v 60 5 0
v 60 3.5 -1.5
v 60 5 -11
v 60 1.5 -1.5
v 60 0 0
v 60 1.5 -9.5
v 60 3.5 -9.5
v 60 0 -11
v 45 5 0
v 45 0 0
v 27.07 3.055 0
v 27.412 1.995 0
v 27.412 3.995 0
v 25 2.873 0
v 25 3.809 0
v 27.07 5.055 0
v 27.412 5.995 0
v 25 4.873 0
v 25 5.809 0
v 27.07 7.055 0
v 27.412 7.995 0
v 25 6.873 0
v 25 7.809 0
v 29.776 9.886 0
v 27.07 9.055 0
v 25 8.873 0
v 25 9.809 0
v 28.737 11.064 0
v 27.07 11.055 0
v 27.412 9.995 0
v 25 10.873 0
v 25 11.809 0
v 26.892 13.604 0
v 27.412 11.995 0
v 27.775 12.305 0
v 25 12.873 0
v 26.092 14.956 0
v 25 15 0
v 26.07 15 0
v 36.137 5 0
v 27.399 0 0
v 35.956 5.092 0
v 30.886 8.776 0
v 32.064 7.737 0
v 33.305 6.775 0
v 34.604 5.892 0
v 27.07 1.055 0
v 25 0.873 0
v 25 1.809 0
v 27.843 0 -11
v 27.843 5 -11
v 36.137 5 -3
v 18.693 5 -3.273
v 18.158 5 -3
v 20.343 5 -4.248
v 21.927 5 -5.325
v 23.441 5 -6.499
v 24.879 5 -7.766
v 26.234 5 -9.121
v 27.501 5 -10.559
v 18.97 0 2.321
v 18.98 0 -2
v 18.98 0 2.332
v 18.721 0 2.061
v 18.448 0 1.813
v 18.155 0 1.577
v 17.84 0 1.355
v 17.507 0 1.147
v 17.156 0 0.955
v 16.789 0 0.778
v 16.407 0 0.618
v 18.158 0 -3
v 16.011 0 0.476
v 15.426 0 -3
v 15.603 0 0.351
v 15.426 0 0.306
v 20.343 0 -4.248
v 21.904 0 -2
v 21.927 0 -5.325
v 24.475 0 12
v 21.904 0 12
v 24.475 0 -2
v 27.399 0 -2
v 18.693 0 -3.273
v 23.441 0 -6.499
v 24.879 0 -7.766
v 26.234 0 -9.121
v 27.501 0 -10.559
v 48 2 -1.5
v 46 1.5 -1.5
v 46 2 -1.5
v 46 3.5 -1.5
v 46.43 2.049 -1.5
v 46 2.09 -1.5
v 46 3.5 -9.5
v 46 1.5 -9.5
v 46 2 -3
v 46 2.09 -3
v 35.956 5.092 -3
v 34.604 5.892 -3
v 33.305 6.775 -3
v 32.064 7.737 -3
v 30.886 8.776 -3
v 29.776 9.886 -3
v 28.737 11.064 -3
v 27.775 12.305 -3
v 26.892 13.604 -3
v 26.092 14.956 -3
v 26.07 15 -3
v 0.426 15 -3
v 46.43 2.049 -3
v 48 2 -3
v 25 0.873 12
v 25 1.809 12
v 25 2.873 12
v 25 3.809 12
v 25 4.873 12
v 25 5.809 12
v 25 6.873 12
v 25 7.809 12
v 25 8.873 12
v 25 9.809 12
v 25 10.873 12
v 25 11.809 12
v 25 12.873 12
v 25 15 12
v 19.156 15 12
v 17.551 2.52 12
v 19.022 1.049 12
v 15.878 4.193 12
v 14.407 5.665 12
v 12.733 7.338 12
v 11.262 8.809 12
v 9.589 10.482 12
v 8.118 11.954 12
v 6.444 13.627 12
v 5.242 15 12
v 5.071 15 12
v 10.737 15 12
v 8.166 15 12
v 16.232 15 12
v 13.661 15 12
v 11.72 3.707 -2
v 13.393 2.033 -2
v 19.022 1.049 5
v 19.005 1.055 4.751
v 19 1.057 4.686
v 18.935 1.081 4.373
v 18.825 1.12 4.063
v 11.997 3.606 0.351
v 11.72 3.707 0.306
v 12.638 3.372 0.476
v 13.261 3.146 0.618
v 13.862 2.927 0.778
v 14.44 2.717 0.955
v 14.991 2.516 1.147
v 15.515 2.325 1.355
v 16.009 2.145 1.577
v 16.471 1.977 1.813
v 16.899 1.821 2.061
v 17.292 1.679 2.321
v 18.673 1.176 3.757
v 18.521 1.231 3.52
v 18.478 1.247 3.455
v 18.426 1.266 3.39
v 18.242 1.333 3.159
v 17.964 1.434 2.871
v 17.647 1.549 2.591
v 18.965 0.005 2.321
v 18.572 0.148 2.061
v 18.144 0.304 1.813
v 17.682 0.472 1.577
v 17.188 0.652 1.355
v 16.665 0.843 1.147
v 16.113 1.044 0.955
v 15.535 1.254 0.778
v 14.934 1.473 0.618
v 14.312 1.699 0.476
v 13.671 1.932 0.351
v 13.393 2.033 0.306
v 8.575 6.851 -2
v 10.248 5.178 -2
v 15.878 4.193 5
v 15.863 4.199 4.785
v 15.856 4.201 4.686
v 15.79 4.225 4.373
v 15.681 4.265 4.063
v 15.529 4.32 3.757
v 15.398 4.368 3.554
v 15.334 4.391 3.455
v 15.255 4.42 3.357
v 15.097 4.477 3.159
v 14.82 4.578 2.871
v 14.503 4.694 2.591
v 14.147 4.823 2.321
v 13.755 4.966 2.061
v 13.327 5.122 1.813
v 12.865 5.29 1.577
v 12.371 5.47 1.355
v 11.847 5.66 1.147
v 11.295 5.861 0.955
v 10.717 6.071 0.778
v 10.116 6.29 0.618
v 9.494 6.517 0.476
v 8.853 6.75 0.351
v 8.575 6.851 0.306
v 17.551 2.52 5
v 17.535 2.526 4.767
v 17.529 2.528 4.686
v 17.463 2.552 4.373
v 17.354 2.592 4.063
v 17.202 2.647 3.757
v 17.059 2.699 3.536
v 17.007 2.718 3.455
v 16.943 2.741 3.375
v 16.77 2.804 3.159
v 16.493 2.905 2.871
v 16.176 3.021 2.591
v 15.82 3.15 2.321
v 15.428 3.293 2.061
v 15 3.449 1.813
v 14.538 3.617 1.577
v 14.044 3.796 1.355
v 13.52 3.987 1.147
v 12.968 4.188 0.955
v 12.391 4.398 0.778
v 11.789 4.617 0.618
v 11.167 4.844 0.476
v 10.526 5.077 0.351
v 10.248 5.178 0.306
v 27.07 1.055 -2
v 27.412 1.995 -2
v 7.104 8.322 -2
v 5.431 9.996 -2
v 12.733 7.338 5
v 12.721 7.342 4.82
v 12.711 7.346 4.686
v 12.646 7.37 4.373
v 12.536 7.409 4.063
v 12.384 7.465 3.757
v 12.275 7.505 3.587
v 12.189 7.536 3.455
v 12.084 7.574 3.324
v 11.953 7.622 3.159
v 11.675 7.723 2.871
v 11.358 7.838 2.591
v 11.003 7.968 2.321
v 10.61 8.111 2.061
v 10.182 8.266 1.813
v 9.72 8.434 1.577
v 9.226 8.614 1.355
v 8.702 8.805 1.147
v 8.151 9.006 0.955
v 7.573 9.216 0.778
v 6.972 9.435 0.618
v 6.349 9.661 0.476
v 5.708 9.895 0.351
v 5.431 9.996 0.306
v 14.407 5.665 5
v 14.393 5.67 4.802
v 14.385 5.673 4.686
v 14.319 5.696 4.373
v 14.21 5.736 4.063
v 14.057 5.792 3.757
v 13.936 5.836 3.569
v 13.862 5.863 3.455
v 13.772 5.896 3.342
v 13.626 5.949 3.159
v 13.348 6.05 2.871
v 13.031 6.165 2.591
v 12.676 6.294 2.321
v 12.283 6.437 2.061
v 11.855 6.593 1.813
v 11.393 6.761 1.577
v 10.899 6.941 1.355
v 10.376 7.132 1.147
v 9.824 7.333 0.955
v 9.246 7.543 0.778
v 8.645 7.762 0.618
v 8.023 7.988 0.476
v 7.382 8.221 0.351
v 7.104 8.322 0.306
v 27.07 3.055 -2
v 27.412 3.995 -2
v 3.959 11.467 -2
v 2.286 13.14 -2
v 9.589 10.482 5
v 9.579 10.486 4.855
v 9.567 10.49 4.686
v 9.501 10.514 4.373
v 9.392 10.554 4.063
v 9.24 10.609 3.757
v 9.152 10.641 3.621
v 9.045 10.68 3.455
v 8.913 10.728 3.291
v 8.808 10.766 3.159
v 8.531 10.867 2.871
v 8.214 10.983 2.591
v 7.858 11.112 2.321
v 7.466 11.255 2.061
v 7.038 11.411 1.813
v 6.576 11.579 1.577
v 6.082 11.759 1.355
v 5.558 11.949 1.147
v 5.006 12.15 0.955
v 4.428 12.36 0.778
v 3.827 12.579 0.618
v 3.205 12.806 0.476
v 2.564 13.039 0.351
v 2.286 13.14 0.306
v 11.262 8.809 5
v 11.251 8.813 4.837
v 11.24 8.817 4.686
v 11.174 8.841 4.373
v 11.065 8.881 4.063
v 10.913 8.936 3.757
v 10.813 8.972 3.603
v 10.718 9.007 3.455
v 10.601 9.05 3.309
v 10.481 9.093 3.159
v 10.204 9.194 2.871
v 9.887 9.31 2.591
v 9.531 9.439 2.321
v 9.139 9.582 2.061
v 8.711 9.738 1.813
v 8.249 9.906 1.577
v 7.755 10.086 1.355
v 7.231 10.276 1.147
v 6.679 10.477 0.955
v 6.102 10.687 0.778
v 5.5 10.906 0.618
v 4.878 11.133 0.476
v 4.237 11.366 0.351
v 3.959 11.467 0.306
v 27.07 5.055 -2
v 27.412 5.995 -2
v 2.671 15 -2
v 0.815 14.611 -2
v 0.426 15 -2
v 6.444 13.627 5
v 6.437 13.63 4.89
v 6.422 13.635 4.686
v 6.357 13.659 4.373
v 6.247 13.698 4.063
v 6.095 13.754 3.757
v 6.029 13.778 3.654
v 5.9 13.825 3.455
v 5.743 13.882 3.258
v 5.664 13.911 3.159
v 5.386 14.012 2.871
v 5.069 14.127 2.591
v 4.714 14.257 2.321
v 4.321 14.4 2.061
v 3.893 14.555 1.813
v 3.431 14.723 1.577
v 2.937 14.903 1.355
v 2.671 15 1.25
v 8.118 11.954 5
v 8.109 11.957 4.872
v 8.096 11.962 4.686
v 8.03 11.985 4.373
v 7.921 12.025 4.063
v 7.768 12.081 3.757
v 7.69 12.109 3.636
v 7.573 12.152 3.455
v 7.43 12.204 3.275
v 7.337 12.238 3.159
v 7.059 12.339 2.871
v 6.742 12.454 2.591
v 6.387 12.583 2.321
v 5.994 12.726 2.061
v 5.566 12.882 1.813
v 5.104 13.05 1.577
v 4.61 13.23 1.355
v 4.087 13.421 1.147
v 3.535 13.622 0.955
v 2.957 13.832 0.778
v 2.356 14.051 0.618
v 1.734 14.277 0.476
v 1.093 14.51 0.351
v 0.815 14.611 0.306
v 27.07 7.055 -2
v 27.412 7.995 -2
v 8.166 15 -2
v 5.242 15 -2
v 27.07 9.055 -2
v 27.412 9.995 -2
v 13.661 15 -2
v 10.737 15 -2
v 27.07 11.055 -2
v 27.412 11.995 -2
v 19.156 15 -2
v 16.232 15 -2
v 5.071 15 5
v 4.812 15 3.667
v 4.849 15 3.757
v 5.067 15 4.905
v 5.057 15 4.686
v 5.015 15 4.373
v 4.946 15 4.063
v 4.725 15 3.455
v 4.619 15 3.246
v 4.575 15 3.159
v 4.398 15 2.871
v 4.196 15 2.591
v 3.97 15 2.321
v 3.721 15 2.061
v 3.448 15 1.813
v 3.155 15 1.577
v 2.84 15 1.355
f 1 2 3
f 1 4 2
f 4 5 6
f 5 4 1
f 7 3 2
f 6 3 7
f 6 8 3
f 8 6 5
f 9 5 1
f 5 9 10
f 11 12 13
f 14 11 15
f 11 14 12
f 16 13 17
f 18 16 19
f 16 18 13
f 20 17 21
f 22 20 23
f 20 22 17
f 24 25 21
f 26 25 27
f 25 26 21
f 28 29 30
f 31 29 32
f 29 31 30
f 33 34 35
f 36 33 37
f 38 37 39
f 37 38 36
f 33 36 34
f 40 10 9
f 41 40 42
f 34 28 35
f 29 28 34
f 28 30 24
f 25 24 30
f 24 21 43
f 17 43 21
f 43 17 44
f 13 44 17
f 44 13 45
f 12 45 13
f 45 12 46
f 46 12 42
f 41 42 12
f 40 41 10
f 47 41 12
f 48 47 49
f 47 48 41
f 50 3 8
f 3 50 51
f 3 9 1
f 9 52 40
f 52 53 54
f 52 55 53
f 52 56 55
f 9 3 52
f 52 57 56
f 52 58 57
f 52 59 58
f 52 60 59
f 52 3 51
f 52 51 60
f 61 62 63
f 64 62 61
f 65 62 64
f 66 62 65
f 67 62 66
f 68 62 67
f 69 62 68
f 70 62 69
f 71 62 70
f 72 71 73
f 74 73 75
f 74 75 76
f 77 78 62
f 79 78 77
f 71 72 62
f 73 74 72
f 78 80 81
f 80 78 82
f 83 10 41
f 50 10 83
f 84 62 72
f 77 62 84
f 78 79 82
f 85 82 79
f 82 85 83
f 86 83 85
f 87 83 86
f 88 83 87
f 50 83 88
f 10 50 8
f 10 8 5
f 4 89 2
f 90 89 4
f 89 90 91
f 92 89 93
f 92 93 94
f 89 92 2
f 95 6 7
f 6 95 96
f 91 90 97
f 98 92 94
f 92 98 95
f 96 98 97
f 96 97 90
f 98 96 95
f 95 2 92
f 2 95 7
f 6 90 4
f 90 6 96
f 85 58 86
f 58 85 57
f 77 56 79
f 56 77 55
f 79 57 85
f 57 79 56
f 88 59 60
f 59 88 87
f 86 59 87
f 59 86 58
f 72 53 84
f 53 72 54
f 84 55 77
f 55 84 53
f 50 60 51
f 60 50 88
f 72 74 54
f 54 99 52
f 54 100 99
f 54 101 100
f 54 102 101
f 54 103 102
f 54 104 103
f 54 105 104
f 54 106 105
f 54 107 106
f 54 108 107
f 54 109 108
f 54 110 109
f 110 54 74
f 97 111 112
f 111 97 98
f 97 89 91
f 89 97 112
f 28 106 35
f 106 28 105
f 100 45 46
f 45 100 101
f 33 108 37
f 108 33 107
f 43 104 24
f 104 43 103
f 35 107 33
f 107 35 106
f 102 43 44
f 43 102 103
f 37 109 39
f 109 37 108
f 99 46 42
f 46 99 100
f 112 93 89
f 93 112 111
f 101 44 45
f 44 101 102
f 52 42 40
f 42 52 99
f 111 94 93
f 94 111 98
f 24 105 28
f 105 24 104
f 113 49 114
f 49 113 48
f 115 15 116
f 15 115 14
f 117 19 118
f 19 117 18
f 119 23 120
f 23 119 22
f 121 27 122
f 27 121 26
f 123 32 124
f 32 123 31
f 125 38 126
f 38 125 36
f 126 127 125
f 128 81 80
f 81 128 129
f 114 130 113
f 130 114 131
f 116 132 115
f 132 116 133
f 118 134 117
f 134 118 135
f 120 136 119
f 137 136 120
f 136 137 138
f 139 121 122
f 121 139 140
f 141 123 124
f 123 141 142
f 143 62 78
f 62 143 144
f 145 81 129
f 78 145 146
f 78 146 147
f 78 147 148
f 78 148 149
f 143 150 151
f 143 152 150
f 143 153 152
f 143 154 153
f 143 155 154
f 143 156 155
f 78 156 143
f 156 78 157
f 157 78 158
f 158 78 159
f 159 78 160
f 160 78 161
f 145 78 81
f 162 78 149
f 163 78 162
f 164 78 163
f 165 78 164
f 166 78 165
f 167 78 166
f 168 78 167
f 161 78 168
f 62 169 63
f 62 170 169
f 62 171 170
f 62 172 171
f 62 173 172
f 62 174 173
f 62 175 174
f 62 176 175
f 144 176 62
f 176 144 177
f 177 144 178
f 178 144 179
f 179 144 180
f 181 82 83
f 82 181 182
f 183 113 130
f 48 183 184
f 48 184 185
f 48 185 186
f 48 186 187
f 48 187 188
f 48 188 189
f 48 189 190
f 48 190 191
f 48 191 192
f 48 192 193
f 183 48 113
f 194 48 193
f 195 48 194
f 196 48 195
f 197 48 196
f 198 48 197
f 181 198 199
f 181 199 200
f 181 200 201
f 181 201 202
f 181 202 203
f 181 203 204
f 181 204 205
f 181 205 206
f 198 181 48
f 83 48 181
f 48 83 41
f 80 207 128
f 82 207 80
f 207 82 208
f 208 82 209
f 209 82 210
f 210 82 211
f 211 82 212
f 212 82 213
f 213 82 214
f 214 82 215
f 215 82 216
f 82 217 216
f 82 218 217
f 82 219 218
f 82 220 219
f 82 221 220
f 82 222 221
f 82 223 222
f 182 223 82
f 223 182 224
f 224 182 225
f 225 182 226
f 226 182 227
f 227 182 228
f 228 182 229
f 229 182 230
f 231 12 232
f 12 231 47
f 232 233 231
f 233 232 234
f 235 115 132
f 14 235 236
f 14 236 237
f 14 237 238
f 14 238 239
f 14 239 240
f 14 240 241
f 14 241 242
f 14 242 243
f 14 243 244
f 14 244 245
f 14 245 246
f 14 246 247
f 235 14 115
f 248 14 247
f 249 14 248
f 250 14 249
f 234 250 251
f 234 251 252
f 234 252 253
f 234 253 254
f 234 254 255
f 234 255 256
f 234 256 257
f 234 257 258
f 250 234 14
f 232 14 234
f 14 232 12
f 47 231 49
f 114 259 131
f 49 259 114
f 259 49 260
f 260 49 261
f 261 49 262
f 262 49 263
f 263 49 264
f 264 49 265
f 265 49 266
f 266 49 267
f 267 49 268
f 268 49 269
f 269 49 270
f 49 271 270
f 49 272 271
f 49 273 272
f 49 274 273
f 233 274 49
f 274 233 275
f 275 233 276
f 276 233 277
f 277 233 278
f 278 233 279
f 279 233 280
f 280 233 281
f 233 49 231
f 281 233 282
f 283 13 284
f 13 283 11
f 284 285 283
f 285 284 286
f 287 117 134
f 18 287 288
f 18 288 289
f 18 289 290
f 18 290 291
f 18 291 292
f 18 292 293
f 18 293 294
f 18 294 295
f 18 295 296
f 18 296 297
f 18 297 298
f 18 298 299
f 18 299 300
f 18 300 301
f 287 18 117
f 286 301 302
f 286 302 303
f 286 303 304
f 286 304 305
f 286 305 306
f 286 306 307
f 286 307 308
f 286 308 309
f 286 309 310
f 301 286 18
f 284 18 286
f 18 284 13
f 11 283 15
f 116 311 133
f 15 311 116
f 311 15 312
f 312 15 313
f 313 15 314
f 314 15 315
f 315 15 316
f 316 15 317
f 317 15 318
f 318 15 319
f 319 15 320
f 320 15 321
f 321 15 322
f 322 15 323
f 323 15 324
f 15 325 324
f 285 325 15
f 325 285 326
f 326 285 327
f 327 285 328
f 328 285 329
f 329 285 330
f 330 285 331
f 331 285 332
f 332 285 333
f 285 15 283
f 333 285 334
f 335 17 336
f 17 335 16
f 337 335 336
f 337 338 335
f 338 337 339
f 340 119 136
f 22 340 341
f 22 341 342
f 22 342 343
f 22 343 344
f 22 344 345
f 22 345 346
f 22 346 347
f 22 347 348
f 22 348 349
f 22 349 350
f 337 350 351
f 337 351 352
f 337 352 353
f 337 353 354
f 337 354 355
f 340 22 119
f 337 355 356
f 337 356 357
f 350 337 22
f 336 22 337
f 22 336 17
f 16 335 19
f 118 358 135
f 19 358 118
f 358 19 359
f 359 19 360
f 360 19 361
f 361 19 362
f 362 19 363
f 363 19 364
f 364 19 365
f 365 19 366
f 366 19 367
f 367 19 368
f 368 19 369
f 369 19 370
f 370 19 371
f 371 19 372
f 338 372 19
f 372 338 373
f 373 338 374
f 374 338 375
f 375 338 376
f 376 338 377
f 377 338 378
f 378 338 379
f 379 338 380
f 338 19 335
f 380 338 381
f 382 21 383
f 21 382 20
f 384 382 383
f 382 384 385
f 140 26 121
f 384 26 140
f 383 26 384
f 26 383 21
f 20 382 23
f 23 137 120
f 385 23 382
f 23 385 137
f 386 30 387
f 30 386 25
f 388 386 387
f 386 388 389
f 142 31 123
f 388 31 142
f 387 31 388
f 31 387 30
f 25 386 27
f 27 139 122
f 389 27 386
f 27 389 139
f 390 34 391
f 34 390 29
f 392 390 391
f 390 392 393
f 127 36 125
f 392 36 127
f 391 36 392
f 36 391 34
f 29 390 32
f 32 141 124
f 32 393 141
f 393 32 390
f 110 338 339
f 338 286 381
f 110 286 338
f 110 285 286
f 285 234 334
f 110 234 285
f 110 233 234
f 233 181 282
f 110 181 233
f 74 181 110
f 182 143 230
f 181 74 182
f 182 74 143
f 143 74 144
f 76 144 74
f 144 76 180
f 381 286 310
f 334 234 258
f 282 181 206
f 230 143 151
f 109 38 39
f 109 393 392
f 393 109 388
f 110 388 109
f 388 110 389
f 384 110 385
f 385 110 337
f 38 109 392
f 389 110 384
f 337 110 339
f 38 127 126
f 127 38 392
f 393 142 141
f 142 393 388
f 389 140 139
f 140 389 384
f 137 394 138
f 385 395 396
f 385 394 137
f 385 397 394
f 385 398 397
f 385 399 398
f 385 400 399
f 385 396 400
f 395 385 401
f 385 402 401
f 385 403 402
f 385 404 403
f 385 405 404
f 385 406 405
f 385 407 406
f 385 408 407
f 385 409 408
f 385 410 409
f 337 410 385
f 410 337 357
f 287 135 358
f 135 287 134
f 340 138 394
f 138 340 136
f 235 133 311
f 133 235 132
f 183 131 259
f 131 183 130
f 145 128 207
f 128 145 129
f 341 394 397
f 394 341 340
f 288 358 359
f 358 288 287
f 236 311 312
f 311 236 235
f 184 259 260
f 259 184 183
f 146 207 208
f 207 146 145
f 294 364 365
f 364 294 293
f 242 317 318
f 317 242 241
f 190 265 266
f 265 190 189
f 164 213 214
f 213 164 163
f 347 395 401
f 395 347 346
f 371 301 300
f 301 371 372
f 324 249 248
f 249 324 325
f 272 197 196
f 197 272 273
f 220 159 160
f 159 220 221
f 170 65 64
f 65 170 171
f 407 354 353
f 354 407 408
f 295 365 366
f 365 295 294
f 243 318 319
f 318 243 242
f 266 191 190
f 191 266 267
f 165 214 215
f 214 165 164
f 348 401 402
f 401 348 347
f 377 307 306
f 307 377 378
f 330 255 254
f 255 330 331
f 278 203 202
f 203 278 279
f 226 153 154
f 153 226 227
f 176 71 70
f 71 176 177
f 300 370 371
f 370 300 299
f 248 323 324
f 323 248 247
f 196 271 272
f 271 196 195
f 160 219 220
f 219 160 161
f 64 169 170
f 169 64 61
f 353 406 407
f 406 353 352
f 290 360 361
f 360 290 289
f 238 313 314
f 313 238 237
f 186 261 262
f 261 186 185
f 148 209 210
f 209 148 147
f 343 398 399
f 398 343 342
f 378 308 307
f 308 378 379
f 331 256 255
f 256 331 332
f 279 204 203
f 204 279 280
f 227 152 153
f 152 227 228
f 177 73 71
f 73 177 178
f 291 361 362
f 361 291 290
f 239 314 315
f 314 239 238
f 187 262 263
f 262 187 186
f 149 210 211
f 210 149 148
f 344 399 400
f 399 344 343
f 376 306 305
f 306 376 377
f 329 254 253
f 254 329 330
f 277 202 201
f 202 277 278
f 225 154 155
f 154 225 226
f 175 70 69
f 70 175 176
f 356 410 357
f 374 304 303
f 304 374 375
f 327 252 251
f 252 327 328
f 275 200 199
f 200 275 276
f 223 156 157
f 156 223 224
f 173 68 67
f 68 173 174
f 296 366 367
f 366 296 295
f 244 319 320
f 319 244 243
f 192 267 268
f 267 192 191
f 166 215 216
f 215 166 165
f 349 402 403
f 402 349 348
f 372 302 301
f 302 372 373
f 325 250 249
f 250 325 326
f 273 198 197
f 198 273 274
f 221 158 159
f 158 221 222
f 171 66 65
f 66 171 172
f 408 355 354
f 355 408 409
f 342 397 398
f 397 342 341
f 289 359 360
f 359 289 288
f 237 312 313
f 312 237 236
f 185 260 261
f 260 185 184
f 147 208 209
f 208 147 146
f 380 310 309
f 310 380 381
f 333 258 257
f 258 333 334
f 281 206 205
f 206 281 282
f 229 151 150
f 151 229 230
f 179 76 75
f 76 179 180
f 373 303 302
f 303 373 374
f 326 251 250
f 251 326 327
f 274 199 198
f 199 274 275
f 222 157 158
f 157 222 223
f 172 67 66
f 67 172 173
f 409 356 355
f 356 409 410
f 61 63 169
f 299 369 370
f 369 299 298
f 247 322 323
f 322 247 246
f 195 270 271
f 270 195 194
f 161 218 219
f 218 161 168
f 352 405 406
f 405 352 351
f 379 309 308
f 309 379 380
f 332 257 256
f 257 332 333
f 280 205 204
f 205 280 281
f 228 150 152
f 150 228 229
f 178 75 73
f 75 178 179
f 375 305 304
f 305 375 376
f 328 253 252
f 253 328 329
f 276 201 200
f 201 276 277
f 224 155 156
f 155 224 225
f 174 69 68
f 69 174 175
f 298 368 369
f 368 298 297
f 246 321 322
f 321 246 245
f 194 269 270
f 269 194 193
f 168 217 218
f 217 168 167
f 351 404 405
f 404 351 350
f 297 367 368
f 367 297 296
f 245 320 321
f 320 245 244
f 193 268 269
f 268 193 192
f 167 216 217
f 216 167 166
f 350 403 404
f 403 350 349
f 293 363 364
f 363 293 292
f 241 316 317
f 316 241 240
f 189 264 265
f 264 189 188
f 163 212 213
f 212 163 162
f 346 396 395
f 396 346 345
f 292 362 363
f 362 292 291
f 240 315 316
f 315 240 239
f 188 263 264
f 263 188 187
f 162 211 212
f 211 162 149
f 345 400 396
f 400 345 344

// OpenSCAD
$fn = 100;

difference(){
    union(){
        translate([0,0,0]){
            difference(){
                union(){
                    translate([0,0,-3]){
                        cube([25,39,15]);
                    }
                    difference(){
                        translate([0,0,-11]){
                            cube([60,5,11]);
                        }        
                        translate([46,1.5,-9.5]){
                            cube([15,2,8]);
                        }      
                        translate([4,48,-30]){
                            rotate([90,0,0]){
                                cylinder(h = 50, d = 61);
                            }
                        }
                    }
                    translate([48,27,-3]){
                        rotate([180,180,0]){
                            arch();
                        }
                    } 
                }       
      
                for (i = [8:2:22]){               
                    translate([-3,i,-2]){
                        rotate([0,0,-20]){
                            cube([32,1,21]);
                        }
                    }
                }
            }
        }
    }
    
    translate([23,-50,-5]){
        rotate([0,0,45]){
         cube([30,70,40]);
        }
    }    
 
    translate([25,-20,0]){
     cube([20,50,60]);
    }
    translate([-10,15,-10]){
     cube([50,60,60]);
    }
    
    hull(){
    translate([-7,20,5]){
        rotate([0,90,-45]){
           cylinder(h=40,d=10);
        }
    }
    translate([-7,20,15]){
        rotate([0,90,-45]){
            cylinder(h=40,d=10);
        }
    }
    }
}

module arch(){
    difference(){
        cube([25,25,3]);
        translate([0,0,-2]){
           cylinder(h=50,d=50);
        }
    }
}







        
        
